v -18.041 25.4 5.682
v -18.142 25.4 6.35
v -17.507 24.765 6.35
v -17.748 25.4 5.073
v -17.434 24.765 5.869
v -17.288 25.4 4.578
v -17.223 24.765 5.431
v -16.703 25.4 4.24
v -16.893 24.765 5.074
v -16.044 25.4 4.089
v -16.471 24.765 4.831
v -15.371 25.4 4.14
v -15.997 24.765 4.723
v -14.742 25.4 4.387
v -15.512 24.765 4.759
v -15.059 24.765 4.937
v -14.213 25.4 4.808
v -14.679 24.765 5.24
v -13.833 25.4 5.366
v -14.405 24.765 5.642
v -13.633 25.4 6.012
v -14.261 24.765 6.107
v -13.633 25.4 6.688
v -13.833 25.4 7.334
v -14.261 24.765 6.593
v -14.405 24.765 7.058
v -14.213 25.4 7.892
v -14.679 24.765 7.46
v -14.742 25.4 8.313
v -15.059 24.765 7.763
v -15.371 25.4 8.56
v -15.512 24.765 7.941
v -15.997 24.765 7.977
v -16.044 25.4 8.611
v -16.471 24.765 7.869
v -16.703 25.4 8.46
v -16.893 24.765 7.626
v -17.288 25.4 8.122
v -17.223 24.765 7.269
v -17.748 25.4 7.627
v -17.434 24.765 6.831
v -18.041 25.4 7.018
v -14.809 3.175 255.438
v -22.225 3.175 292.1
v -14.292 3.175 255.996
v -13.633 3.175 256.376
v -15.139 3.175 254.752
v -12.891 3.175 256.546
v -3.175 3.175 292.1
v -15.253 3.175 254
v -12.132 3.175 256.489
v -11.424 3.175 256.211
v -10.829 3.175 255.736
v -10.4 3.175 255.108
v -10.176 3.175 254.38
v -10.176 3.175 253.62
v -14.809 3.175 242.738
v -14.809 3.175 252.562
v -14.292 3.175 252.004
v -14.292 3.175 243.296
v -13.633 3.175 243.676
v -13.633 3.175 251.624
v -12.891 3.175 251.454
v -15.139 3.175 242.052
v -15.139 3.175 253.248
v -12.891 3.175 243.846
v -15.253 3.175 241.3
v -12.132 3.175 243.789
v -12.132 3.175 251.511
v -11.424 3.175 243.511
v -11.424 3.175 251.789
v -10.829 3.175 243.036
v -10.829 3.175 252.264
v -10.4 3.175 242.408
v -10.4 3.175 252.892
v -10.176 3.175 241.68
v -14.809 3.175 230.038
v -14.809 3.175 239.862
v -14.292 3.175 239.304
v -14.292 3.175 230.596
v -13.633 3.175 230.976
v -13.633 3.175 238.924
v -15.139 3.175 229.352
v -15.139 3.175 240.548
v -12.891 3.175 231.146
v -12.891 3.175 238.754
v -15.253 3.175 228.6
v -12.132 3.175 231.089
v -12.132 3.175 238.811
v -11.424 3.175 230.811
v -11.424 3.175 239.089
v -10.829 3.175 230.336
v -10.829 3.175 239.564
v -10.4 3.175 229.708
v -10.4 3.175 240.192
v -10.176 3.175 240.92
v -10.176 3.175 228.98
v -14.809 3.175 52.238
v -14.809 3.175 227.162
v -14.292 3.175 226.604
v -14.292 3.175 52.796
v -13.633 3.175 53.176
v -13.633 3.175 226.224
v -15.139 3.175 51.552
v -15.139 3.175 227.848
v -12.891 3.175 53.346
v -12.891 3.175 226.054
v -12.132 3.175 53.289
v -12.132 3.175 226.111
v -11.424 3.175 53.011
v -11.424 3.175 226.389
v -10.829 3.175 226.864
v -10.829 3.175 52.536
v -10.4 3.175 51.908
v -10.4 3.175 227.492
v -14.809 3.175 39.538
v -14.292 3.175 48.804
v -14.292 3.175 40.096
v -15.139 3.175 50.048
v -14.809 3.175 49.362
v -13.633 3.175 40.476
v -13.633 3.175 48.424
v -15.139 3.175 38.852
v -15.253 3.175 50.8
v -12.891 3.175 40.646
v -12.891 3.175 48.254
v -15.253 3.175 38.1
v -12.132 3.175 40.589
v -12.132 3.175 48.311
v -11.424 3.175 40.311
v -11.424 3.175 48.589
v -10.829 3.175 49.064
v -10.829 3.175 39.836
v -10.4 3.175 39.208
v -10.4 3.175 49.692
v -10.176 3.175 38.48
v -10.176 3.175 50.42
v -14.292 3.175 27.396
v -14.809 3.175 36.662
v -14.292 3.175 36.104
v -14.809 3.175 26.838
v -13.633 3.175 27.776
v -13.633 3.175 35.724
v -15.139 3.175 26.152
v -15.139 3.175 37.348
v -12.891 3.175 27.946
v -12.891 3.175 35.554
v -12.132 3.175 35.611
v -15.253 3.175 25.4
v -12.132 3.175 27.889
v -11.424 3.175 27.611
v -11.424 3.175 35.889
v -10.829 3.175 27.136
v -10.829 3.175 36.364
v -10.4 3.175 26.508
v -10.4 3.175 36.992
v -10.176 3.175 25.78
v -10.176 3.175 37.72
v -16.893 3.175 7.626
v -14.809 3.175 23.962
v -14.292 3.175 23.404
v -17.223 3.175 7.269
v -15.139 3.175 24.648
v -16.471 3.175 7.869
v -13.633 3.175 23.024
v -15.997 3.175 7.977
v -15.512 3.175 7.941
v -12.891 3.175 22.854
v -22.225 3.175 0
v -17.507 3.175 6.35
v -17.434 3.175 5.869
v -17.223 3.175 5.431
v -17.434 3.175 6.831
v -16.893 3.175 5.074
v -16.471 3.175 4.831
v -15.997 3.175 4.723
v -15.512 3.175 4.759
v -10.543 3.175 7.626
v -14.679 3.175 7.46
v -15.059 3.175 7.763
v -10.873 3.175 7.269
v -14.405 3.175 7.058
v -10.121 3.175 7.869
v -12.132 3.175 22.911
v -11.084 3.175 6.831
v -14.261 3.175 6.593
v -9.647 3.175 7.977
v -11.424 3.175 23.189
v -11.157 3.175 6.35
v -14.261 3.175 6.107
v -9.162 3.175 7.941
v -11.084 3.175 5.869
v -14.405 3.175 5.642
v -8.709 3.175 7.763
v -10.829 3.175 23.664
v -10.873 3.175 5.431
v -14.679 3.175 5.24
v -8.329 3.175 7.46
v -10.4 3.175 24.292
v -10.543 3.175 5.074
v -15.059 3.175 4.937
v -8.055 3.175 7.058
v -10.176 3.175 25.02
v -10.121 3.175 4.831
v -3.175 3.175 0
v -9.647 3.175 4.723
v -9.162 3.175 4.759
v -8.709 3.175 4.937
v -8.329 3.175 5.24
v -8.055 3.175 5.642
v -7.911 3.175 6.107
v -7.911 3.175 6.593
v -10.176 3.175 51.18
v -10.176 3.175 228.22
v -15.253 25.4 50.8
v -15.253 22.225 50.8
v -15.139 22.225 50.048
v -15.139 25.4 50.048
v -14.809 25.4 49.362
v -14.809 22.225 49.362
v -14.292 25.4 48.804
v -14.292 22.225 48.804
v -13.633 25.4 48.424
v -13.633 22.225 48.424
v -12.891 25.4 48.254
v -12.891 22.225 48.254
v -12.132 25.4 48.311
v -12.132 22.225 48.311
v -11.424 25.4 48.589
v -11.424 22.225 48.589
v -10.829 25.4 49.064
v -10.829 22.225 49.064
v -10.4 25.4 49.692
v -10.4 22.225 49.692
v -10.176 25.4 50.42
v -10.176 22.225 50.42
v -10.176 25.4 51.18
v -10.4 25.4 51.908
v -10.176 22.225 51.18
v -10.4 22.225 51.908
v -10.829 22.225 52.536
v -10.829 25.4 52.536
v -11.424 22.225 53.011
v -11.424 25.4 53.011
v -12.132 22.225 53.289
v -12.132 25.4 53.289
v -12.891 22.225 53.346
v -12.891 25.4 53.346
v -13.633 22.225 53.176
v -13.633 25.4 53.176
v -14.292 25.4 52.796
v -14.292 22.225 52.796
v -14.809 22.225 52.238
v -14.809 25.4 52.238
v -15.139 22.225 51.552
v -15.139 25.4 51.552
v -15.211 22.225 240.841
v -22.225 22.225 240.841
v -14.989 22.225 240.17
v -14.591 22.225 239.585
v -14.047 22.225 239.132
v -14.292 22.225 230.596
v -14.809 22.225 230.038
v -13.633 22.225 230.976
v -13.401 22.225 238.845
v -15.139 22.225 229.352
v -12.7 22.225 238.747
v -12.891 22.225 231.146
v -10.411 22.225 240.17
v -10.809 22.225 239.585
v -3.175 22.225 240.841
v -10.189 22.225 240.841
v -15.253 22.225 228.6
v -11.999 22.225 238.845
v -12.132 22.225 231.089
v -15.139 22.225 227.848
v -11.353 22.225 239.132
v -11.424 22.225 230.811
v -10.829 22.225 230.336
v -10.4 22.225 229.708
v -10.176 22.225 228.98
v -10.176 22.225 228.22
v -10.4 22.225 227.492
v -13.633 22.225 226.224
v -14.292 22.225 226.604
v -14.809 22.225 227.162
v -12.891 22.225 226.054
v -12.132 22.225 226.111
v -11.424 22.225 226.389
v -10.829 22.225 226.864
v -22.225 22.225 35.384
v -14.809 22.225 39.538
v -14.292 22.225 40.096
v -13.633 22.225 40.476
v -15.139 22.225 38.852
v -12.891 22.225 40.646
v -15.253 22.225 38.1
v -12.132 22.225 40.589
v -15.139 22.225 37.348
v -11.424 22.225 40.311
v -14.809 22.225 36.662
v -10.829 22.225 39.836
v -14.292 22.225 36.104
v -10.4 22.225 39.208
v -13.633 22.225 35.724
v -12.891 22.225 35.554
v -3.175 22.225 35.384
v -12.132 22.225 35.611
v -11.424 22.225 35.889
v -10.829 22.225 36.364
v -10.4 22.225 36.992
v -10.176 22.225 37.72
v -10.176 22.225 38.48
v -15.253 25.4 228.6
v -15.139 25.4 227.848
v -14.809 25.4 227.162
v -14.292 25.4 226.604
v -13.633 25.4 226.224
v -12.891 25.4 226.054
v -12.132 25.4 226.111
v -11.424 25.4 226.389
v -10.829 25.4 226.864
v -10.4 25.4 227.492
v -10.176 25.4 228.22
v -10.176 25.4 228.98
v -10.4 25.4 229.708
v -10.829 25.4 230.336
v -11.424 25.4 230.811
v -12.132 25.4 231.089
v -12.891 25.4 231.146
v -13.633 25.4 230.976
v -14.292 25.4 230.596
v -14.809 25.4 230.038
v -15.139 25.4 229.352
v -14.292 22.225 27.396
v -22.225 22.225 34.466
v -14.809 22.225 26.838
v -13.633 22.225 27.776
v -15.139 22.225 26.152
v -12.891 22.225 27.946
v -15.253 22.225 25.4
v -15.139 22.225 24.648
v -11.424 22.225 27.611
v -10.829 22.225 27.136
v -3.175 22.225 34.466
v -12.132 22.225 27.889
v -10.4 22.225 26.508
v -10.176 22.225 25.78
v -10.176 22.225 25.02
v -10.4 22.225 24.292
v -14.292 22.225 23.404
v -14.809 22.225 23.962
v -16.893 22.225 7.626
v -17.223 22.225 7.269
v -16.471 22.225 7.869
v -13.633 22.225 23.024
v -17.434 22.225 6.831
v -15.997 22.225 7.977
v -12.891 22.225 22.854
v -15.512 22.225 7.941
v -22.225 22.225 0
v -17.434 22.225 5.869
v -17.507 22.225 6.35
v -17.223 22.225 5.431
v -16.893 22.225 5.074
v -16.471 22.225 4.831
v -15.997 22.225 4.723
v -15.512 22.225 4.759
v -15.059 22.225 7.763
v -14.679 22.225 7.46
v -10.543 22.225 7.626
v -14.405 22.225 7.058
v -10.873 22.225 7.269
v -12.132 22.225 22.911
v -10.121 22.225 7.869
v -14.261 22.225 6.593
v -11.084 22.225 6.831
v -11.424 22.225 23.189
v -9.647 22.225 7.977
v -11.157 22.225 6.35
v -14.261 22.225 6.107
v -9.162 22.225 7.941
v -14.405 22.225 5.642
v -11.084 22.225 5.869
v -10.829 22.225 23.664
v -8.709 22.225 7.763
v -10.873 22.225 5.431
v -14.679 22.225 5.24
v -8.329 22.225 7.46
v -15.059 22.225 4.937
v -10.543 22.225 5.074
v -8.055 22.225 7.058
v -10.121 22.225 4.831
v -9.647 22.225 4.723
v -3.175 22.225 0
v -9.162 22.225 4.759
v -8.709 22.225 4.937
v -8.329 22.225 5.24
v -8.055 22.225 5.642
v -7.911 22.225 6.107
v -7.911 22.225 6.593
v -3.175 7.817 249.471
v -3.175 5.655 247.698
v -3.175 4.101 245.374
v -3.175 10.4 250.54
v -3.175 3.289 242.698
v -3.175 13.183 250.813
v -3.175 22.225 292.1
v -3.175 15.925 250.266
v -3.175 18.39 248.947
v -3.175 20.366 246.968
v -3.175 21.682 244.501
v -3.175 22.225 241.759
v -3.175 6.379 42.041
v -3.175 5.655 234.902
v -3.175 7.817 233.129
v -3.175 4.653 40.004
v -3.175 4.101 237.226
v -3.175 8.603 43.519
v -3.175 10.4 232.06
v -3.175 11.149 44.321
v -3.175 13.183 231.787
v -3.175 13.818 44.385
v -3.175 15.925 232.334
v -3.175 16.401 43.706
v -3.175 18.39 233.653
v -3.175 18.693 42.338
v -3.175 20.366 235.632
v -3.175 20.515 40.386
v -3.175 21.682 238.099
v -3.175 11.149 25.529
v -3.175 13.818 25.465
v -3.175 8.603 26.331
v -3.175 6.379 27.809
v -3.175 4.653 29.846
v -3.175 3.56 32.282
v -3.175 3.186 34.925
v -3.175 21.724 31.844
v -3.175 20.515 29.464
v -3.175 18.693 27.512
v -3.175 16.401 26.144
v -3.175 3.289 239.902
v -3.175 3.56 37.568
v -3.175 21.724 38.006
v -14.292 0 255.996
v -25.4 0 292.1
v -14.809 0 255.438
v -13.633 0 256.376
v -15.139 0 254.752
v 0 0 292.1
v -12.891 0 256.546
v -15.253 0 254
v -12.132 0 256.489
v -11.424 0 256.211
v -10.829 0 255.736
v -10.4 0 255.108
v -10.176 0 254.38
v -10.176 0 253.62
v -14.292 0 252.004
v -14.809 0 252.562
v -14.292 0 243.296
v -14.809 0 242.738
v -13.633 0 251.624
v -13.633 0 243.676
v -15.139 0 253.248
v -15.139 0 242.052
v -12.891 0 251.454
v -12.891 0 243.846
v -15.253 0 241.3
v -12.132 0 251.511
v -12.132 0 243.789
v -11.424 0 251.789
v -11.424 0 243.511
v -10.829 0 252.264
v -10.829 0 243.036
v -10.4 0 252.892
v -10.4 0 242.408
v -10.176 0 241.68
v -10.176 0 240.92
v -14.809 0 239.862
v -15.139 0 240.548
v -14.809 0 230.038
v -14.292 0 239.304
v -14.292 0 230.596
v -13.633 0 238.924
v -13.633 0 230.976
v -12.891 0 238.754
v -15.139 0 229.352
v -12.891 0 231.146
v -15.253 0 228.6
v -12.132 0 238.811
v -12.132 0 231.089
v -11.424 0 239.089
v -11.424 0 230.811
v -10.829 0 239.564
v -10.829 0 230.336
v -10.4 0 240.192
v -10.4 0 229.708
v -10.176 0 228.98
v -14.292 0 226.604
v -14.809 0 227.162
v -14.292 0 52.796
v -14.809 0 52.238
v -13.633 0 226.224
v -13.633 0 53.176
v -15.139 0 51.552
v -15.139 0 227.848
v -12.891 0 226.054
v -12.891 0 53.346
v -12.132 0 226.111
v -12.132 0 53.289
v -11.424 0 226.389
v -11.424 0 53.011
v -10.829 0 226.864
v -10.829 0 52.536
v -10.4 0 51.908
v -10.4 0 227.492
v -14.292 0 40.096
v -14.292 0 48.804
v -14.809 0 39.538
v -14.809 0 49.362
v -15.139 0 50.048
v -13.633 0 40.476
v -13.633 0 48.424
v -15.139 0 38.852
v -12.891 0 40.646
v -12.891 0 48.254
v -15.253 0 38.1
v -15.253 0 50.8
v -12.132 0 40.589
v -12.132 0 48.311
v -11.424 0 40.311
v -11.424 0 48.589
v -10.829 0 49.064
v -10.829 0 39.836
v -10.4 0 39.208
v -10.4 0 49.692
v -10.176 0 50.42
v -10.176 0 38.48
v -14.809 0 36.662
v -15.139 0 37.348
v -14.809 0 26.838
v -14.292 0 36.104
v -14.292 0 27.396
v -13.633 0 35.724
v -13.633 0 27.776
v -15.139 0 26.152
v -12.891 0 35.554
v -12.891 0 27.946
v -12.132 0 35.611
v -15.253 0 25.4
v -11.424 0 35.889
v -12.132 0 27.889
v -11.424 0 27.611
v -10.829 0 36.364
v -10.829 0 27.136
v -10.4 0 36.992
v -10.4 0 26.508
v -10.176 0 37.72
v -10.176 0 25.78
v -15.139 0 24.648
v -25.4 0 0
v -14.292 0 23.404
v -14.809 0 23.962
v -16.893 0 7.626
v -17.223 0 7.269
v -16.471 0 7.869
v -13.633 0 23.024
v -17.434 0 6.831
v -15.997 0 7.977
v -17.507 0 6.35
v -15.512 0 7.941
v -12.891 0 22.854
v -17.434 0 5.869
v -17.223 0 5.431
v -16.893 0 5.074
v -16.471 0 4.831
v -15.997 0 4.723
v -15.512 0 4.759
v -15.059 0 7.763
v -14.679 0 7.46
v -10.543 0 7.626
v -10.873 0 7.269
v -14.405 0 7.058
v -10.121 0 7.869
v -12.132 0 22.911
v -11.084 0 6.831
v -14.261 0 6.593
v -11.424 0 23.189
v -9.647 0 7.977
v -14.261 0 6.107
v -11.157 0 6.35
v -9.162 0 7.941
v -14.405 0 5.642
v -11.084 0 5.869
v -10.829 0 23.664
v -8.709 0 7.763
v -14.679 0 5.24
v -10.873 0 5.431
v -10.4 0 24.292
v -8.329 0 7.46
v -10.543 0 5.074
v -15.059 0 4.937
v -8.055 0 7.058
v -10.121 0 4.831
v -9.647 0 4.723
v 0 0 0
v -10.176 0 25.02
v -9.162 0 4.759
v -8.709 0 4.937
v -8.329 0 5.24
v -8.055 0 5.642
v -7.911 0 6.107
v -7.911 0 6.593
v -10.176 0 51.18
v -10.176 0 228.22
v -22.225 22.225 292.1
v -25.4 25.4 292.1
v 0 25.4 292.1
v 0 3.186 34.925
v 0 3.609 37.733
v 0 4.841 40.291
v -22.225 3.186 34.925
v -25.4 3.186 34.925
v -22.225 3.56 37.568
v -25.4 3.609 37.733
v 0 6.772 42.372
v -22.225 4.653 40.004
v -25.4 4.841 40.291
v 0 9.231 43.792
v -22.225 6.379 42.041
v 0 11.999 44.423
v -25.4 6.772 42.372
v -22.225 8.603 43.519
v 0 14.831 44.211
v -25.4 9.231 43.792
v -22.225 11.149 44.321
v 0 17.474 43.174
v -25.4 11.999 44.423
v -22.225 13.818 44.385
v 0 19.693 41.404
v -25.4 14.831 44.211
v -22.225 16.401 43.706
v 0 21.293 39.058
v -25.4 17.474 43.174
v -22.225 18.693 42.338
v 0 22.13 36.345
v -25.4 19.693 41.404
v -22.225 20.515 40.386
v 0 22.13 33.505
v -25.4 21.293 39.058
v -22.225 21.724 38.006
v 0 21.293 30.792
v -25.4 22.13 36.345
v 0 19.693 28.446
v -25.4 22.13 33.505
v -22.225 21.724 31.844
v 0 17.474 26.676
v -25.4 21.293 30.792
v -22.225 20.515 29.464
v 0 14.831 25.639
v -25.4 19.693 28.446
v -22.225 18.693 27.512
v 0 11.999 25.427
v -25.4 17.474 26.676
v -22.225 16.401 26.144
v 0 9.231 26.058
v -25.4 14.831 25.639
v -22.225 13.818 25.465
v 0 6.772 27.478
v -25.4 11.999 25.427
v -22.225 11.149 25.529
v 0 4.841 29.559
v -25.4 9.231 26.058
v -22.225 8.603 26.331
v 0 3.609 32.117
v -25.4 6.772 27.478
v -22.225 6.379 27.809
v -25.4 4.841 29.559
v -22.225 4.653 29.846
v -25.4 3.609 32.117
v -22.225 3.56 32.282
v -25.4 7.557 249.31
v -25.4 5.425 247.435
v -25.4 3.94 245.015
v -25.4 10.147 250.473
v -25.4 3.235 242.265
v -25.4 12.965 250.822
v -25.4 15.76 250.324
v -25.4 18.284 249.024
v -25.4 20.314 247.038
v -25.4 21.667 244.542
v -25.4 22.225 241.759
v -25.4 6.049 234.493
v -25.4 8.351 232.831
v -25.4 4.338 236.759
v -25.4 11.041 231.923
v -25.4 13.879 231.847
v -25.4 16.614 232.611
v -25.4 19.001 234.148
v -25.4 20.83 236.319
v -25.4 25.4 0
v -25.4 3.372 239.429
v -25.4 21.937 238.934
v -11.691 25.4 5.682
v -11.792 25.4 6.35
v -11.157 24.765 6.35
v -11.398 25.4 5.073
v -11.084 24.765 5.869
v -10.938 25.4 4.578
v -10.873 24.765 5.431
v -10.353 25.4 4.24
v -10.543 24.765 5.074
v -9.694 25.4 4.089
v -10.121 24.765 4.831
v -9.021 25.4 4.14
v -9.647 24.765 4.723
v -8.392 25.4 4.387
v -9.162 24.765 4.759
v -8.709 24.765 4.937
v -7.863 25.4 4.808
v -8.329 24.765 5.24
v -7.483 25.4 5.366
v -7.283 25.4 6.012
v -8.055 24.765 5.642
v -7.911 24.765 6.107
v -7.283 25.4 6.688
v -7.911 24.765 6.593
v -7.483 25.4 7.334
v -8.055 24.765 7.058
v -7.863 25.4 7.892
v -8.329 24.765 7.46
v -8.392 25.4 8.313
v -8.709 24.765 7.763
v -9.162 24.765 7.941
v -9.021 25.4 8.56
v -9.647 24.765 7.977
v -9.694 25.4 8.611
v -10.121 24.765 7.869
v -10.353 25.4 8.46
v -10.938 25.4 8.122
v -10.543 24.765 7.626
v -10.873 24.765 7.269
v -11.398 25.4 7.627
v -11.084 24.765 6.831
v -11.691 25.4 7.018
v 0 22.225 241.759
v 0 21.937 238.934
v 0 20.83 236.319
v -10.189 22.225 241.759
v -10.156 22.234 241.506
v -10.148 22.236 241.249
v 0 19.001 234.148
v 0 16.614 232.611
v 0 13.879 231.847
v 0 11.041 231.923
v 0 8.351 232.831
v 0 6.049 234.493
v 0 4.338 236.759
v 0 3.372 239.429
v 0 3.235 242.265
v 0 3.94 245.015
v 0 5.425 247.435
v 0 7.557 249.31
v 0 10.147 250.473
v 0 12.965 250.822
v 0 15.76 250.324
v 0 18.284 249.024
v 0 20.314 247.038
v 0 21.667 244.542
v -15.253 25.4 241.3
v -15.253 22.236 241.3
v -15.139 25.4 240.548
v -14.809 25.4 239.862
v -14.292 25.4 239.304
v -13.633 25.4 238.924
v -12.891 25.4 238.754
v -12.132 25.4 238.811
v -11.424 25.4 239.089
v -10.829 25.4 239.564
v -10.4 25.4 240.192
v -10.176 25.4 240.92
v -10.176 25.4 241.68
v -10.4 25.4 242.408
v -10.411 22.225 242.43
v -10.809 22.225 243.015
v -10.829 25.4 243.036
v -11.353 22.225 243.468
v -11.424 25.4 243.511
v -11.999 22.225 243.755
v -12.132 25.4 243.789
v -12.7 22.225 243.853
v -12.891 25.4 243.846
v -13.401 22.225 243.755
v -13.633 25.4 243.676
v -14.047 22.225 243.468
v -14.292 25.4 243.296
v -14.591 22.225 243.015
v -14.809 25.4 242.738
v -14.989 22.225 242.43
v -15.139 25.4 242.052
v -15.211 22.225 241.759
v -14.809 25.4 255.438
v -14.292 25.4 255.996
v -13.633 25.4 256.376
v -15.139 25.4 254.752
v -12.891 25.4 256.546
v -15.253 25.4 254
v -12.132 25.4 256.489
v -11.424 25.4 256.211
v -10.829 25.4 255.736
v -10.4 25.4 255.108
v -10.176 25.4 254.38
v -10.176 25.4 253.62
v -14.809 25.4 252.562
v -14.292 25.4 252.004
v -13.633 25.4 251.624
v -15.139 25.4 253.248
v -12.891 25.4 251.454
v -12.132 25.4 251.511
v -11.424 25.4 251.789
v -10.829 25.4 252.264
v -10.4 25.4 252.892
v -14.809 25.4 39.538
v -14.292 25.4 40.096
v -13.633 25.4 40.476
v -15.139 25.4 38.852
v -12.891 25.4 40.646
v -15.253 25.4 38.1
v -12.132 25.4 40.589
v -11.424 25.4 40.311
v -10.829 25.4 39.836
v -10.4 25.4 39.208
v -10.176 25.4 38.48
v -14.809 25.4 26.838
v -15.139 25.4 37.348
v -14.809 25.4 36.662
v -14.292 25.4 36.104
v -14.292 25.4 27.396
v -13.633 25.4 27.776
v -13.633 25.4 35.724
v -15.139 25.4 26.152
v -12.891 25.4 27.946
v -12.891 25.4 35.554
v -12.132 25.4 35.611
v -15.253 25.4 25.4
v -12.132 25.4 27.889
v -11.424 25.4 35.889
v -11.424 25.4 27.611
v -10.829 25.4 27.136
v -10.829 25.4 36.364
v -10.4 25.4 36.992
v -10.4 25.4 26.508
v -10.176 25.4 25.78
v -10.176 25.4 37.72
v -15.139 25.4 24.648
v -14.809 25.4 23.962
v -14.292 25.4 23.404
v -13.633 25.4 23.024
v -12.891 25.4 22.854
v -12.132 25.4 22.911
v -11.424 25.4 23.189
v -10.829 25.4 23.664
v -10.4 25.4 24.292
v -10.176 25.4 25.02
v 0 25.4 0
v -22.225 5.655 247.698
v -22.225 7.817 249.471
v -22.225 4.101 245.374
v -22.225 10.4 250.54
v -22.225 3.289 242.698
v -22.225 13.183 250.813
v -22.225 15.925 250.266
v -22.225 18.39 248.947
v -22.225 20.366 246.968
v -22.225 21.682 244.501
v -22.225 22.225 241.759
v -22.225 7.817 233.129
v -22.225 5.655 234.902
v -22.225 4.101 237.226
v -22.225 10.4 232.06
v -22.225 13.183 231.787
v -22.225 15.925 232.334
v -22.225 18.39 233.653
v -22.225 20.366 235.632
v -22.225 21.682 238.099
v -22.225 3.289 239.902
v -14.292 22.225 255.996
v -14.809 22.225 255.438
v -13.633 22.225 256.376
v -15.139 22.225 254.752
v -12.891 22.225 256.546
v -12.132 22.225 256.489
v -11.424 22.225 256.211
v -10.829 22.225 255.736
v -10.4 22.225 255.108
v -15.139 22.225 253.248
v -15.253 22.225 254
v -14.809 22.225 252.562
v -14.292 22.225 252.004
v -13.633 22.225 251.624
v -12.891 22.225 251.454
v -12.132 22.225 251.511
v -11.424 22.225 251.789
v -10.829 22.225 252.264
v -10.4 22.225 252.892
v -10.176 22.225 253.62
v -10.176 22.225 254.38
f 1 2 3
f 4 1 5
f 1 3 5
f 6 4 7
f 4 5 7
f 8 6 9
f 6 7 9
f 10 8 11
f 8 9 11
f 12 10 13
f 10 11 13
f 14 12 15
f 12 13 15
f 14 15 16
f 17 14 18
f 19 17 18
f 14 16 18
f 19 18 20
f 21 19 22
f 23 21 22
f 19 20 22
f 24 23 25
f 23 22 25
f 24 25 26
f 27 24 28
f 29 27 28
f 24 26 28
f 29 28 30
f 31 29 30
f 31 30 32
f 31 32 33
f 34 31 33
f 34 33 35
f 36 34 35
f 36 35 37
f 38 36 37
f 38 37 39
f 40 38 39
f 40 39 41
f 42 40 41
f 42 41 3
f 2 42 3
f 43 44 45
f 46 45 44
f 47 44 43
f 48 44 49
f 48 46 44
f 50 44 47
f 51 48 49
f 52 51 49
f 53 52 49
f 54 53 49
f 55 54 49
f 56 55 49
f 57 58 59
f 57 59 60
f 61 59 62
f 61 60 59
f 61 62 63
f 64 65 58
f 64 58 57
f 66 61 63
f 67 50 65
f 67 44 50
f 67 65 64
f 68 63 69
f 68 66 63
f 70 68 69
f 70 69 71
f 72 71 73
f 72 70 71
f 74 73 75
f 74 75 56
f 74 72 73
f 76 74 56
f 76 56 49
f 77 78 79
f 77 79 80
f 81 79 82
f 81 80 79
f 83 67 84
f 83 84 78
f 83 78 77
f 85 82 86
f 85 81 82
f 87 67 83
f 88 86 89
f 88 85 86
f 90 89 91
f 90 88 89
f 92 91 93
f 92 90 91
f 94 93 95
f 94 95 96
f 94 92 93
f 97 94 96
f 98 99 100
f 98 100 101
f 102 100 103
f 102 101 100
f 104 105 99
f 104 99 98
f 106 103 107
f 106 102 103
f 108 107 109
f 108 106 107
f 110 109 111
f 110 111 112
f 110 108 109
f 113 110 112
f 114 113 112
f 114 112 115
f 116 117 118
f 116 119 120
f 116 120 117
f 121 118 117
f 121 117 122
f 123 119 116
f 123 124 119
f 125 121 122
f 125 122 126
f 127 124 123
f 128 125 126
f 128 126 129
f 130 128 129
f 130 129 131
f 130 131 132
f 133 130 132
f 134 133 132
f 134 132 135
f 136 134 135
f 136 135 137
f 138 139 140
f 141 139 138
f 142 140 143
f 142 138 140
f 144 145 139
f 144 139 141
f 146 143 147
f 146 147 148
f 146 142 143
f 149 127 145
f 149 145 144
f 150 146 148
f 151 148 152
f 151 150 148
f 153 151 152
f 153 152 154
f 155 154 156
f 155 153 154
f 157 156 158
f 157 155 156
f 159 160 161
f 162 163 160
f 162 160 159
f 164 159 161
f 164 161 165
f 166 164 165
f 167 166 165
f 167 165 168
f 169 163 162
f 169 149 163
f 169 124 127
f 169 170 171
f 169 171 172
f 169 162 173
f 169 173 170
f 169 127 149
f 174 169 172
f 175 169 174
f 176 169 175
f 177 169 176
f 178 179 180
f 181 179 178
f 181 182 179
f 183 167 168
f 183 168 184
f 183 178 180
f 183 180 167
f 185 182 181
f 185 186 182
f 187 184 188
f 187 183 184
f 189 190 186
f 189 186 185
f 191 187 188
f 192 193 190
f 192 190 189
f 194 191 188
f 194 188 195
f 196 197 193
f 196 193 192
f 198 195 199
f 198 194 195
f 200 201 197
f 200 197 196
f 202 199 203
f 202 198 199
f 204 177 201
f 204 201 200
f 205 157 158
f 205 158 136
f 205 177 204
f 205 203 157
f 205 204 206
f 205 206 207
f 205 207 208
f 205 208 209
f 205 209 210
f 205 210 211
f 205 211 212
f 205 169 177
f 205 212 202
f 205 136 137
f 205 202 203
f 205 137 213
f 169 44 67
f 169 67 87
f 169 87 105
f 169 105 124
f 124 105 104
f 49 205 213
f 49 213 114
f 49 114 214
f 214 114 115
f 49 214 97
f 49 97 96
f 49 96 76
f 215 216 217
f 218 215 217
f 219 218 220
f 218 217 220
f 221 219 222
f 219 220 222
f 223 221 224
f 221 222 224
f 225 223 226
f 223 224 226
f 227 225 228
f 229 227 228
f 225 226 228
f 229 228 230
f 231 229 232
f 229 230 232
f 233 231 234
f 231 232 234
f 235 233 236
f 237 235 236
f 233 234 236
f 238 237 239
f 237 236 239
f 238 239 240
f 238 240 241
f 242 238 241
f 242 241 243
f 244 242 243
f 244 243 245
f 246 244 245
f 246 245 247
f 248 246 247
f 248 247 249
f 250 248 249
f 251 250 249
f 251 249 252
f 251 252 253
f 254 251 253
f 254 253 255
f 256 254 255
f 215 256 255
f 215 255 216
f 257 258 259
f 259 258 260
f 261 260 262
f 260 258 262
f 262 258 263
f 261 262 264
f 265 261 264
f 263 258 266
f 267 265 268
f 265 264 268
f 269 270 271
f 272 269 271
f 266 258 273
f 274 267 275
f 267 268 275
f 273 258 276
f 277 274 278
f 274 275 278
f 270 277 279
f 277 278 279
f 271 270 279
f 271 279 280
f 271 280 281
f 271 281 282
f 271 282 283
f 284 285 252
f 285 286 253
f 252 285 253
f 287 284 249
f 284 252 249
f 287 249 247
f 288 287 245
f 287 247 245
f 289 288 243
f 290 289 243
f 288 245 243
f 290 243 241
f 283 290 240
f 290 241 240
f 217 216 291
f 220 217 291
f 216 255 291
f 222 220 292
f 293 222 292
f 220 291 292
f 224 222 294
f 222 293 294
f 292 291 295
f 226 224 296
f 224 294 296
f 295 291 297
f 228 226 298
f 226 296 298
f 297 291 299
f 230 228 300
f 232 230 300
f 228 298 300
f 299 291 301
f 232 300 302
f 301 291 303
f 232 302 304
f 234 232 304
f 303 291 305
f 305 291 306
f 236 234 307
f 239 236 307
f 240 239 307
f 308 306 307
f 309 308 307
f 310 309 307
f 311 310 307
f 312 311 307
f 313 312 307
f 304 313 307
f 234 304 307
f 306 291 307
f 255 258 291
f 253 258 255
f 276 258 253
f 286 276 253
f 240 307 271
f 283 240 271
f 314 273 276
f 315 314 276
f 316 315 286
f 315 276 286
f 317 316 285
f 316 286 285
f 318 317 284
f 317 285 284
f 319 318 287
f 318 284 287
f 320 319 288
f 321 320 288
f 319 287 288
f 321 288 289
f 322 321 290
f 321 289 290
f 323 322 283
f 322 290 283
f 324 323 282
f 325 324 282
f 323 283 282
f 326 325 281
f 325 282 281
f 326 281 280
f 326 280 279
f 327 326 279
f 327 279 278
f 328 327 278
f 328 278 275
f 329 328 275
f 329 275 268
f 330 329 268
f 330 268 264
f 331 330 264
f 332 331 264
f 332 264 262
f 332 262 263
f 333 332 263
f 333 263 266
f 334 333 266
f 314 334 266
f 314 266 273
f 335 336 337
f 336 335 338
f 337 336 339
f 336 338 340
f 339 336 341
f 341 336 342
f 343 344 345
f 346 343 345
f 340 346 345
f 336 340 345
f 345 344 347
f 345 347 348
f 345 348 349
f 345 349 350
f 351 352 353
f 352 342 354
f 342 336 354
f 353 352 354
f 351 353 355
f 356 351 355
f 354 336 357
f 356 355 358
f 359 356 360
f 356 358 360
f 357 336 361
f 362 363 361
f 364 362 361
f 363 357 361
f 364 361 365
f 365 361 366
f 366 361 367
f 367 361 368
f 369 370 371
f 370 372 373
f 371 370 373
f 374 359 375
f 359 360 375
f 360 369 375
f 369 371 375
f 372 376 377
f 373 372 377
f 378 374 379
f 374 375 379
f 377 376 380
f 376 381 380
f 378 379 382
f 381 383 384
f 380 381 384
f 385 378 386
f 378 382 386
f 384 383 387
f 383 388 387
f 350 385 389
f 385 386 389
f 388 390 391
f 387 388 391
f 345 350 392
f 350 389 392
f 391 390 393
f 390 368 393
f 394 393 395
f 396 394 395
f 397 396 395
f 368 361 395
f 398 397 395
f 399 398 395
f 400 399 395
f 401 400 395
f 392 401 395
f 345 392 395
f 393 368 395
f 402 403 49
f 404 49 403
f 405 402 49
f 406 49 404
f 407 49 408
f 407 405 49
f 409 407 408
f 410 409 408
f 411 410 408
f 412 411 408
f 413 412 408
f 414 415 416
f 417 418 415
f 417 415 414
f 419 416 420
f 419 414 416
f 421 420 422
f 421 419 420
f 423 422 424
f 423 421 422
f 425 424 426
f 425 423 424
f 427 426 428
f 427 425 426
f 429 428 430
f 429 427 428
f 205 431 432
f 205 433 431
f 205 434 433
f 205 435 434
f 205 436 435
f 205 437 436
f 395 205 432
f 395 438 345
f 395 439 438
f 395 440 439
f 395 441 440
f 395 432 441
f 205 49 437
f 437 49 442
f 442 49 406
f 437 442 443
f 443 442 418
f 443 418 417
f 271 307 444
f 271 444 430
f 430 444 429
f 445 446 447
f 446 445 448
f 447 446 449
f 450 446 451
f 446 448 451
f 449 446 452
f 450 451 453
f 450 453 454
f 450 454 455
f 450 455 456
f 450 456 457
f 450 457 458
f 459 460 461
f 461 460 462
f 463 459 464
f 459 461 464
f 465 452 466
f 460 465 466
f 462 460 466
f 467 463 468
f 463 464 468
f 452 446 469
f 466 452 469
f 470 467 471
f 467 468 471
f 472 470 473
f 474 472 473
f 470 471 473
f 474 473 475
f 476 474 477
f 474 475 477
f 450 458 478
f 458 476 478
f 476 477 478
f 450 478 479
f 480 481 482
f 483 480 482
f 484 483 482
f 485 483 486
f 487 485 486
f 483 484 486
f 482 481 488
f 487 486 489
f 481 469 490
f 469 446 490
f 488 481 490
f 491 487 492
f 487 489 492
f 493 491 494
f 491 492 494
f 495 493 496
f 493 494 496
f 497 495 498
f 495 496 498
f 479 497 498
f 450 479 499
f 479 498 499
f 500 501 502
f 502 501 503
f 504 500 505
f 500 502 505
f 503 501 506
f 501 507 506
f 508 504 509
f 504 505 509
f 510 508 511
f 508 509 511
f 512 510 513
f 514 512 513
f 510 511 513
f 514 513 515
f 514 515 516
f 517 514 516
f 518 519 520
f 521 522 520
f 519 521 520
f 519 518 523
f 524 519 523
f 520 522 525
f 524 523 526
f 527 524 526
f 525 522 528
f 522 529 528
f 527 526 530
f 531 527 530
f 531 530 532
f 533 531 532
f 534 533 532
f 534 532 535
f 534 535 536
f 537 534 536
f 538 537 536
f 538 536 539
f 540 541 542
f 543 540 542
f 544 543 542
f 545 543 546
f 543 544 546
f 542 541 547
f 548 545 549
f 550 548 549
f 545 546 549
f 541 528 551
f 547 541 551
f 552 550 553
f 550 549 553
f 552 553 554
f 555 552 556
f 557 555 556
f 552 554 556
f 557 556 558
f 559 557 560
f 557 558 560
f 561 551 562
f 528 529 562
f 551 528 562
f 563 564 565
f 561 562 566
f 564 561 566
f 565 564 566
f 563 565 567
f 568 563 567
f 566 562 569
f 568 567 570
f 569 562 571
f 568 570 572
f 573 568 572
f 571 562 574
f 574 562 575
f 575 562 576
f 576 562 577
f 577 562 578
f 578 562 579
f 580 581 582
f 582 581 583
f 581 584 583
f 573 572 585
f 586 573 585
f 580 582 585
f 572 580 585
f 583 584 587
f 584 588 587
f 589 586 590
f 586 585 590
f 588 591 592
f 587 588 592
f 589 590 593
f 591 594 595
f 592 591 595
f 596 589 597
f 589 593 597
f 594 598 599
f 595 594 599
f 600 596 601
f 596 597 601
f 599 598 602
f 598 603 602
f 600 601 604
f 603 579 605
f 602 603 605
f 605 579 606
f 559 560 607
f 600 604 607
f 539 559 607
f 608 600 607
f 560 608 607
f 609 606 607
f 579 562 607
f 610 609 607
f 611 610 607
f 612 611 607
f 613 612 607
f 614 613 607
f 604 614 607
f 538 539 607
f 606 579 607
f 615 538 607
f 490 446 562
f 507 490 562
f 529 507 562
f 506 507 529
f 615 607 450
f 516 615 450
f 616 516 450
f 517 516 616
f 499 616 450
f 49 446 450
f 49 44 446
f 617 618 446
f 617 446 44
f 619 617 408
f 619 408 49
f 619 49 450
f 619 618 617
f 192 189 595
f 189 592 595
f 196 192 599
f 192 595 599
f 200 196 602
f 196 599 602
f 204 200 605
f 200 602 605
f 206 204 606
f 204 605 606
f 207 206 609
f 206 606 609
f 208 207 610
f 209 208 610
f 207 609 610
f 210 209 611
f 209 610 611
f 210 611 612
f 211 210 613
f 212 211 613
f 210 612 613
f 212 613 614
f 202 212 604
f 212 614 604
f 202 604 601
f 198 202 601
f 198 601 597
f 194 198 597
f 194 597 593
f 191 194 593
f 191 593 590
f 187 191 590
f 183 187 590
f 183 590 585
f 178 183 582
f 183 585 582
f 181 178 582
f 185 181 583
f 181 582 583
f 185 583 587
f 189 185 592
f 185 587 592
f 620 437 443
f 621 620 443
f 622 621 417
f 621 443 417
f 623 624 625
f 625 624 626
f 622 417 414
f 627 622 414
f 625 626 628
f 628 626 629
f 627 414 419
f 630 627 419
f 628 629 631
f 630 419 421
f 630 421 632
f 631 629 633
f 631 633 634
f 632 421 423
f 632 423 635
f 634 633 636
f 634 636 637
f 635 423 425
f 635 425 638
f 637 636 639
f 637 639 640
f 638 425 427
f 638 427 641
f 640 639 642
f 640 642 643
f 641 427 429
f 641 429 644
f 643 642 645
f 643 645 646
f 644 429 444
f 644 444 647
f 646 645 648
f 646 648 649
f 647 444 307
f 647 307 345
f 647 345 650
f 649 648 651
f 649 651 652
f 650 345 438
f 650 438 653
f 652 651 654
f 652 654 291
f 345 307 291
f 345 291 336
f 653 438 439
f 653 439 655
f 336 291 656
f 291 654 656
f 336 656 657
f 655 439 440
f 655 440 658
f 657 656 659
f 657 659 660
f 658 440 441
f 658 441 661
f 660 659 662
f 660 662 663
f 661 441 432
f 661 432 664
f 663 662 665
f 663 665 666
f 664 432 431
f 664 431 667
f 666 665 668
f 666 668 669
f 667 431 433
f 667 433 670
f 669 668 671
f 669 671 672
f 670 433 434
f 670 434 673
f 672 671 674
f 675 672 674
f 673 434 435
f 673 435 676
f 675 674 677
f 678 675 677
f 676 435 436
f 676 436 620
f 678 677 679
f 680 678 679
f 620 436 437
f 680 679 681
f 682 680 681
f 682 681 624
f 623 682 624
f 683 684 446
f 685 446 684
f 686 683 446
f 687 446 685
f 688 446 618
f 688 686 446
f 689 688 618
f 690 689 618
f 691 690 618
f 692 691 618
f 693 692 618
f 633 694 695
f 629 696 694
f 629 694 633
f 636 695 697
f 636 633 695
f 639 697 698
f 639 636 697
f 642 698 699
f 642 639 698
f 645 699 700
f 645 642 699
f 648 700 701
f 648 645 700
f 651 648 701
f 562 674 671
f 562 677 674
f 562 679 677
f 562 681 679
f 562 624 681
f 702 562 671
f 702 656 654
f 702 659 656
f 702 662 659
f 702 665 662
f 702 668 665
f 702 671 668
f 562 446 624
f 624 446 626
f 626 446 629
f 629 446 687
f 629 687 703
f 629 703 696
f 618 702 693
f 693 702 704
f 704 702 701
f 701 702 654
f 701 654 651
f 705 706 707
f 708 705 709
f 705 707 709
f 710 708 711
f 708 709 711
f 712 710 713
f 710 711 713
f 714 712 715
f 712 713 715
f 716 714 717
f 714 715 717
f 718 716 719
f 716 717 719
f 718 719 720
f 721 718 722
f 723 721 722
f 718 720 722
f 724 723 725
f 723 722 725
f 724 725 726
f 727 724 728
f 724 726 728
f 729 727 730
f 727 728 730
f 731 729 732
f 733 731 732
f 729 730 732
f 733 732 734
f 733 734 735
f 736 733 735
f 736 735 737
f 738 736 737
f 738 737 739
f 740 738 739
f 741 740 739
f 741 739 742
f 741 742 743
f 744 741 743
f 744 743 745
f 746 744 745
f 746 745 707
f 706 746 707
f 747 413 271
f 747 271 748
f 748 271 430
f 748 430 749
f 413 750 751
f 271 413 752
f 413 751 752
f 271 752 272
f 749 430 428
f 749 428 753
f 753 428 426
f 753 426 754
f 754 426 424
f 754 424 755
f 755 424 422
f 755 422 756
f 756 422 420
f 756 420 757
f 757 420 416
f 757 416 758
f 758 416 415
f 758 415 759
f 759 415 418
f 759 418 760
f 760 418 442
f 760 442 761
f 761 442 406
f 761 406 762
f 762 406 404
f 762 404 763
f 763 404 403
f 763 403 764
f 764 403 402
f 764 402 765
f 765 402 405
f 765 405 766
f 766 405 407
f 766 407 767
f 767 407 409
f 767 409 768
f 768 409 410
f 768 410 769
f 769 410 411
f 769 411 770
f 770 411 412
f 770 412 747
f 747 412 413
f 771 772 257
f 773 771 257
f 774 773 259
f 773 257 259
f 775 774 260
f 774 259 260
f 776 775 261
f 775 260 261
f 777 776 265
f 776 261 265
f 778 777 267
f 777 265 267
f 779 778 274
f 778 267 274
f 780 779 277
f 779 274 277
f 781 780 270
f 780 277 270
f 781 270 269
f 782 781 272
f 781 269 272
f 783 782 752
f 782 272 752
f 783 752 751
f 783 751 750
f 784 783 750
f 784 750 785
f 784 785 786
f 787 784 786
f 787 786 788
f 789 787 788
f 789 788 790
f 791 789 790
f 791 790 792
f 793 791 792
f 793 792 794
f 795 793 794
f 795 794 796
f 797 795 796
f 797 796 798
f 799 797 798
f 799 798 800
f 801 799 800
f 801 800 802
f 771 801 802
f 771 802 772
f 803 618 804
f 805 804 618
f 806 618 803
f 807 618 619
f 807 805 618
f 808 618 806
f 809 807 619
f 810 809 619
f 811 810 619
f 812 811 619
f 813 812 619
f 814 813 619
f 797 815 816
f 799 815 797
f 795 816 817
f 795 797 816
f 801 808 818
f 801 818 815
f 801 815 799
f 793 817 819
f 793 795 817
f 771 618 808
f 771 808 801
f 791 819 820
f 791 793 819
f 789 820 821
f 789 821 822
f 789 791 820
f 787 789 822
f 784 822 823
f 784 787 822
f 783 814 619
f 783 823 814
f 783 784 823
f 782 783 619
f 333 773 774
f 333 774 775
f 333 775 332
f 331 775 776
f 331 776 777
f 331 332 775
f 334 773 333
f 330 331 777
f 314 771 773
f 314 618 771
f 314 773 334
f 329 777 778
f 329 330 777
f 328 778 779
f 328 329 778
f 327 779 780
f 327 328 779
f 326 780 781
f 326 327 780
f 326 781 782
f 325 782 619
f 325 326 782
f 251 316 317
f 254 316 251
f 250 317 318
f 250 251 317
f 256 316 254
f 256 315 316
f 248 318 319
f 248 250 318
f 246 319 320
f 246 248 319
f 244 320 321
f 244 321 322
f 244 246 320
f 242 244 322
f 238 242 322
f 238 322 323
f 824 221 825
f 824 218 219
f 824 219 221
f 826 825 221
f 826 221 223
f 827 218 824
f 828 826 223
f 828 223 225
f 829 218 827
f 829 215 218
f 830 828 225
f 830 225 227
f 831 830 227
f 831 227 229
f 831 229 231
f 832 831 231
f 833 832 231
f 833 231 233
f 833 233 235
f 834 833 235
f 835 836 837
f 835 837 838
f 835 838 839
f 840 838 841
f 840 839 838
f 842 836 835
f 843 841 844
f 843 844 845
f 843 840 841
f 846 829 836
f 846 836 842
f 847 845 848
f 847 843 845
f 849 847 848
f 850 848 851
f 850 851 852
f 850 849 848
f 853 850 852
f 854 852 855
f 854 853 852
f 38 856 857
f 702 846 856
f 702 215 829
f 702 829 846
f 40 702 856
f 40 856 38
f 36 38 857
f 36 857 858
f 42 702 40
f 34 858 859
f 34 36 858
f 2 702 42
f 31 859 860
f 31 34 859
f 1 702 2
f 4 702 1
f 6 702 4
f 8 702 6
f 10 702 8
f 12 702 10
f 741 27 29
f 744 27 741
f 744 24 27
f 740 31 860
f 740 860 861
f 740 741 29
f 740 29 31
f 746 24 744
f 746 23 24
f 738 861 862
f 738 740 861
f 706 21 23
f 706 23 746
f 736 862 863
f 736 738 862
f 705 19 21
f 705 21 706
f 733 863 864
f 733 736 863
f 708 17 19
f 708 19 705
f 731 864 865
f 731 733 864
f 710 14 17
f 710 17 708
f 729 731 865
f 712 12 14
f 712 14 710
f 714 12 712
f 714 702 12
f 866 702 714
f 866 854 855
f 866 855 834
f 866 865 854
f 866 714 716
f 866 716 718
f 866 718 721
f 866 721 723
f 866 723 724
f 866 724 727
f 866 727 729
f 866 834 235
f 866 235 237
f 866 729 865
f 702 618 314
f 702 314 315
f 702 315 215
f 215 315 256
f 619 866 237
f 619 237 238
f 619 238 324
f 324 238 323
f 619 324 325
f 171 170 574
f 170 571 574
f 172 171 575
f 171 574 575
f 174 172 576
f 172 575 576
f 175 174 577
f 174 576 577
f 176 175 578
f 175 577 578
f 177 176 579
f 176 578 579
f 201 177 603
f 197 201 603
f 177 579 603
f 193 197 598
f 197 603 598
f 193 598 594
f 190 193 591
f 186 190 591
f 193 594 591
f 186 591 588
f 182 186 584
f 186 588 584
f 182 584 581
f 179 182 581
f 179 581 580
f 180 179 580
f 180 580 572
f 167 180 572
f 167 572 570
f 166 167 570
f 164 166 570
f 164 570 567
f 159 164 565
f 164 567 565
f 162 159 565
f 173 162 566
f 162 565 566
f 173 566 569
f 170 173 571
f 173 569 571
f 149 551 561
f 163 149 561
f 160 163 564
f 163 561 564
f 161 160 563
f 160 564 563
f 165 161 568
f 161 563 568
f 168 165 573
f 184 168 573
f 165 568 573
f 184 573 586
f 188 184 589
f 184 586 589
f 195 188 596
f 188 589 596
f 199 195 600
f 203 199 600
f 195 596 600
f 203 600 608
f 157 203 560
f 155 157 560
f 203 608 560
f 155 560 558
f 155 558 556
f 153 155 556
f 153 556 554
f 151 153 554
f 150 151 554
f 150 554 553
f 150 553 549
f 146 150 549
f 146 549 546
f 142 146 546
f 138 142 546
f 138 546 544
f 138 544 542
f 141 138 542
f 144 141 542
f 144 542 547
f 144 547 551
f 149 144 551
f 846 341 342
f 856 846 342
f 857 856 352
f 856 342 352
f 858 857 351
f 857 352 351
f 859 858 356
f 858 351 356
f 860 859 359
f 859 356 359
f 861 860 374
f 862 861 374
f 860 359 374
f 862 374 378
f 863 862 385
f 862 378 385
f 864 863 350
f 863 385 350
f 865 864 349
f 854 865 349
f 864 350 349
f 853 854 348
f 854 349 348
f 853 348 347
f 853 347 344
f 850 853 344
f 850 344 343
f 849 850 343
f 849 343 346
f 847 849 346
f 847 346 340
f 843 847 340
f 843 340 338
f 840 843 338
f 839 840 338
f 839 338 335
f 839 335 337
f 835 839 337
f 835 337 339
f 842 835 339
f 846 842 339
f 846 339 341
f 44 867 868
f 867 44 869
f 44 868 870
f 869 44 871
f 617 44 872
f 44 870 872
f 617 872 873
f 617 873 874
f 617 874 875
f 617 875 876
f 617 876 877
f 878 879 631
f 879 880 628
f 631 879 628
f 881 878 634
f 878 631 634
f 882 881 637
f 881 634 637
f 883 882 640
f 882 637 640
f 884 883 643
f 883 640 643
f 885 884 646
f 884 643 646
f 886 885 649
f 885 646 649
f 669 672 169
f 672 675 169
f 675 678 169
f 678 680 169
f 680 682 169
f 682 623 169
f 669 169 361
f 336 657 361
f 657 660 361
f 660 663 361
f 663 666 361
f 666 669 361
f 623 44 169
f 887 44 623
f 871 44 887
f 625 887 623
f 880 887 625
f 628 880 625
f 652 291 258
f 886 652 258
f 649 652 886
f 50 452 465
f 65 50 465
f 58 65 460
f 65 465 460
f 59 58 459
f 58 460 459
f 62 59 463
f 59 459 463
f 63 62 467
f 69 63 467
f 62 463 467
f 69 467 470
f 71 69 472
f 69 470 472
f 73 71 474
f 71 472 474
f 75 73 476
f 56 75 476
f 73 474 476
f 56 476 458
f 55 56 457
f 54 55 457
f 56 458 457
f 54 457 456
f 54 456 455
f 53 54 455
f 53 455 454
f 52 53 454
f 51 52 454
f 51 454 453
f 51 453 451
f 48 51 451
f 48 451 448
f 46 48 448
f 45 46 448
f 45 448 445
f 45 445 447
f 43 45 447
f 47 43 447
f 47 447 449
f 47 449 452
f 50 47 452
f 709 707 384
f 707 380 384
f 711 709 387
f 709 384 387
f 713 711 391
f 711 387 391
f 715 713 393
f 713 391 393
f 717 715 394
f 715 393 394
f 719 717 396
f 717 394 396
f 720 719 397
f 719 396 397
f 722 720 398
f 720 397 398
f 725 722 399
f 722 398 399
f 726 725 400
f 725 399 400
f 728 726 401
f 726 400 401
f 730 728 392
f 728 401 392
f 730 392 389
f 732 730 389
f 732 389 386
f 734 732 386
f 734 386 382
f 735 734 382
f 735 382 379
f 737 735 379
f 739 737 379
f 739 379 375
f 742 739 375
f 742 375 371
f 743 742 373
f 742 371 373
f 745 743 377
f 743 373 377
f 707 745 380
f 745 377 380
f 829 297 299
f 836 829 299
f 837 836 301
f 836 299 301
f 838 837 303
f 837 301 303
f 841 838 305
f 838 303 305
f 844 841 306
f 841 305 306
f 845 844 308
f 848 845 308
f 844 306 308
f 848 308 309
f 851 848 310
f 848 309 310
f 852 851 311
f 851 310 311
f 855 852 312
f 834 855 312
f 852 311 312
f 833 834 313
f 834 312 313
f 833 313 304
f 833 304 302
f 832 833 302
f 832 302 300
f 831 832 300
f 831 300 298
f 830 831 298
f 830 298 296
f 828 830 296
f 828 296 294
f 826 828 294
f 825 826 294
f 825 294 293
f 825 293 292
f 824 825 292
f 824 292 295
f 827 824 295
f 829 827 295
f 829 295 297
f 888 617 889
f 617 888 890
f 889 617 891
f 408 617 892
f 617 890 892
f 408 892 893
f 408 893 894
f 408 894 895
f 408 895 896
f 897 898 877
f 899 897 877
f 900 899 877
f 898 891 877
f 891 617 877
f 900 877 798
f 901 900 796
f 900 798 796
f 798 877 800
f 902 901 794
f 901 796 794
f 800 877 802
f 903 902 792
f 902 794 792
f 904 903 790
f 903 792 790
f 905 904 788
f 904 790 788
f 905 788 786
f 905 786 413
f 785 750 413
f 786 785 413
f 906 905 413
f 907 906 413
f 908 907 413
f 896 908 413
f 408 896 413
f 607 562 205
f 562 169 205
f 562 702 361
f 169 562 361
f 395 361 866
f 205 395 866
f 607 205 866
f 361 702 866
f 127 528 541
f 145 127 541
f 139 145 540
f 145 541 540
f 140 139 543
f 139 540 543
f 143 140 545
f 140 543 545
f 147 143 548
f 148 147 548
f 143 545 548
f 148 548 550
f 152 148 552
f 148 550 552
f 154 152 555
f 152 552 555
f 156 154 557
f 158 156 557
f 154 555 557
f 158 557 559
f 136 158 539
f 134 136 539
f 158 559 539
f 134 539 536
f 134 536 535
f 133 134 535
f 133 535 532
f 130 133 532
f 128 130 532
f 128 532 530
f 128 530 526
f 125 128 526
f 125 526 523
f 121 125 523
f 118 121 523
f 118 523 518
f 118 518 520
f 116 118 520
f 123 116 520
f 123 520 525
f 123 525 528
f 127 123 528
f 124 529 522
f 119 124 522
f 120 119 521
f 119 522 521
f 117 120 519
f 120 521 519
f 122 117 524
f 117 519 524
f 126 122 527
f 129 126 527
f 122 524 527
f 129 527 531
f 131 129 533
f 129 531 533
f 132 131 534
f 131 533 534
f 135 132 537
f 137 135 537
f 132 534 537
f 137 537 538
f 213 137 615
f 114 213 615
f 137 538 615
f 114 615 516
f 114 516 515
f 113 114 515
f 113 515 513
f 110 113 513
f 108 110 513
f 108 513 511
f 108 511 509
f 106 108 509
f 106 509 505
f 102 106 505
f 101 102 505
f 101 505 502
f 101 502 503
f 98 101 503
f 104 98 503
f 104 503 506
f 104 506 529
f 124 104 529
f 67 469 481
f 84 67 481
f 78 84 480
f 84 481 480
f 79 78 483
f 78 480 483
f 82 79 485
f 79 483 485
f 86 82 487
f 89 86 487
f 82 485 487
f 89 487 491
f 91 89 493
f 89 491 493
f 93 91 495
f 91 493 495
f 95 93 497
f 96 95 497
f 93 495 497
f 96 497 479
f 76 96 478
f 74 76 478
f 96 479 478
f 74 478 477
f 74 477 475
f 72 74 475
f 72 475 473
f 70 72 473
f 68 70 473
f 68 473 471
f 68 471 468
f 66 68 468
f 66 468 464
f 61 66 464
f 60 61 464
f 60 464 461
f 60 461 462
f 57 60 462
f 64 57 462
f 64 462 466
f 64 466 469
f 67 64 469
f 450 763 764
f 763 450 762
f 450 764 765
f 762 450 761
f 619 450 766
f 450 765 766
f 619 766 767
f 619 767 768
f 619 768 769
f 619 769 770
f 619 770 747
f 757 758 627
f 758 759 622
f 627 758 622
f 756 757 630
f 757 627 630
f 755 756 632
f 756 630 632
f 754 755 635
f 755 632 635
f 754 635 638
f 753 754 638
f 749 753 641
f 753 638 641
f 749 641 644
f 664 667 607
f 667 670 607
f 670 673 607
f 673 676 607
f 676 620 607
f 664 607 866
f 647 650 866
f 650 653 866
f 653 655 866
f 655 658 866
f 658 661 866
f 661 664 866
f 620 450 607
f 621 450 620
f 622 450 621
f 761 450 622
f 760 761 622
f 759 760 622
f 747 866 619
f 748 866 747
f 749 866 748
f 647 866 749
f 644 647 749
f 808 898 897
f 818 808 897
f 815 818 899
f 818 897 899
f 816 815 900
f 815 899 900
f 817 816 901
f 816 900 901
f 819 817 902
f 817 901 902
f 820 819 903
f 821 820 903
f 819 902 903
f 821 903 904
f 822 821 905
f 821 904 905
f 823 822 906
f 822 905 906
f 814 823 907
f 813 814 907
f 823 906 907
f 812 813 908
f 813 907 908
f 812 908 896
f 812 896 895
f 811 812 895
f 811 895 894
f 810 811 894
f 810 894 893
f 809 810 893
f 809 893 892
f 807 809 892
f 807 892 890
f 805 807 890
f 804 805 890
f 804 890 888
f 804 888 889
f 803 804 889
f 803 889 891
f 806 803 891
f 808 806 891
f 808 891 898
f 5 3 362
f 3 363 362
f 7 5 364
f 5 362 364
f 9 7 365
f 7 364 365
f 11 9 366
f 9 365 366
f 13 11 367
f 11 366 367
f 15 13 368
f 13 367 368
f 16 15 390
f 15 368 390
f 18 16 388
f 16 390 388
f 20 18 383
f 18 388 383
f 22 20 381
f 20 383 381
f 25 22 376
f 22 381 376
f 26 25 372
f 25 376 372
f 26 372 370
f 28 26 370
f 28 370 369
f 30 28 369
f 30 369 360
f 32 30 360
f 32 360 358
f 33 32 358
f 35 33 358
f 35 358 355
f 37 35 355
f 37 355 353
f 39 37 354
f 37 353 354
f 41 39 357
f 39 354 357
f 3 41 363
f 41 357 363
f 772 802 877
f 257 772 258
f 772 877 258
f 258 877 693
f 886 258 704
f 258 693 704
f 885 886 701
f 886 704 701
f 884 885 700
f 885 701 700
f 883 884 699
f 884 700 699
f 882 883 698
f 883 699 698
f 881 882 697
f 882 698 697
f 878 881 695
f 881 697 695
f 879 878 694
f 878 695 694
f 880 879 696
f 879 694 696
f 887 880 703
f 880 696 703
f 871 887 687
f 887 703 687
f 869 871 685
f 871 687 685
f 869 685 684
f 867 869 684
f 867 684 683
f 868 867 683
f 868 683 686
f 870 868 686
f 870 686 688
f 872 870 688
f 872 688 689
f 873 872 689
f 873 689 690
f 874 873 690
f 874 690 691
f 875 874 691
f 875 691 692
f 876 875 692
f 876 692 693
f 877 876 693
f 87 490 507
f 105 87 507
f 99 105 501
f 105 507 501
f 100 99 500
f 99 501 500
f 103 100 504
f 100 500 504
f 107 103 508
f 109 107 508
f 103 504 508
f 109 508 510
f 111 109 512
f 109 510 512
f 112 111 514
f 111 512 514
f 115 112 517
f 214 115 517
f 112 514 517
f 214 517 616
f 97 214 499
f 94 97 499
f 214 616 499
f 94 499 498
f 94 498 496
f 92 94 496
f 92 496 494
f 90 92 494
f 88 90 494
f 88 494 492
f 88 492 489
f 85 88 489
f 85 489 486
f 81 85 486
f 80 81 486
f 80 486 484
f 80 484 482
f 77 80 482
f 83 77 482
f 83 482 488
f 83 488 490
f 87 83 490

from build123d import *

# Parameters (mm, degrees)
SKETCH1_W                       = 25.4
SKETCH1_H                       = 25.4
SKETCH1_W_2                     = 19.05
SKETCH1_H_2                     = 19.05
BOSS_EXTRUDE1_DEPTH             = 292.1
F_10_CLEARANCE_HOLE1_D          = 5.1054
CUT_EXTRUDE1_REACH              = 296.3
SKETCH6_R                       = 9.525
CUT_EXTRUDE1_DIRECTION_2_DEPTH  = 295.300407747
F_4_CLEARANCE_HOLE1_D           = 3.2639
F_4_CLEARANCE_HOLE1_CSINK_D     = 4.5339
F_4_CLEARANCE_HOLE1_CSINK_ANGLE = 90
F_10_CLEARANCE_HOLE2_D          = 5.1054


with BuildPart() as part:
    # Sketch1 → Boss-Extrude1 (new body)
    with BuildSketch(Plane.XY):
        with Locations((-12.7, 12.7)):
            Rectangle(SKETCH1_W, SKETCH1_H)
        with Locations((-12.7, 12.7)):
            Rectangle(SKETCH1_W_2, SKETCH1_H_2, mode=Mode.SUBTRACT)
    extrude(amount=BOSS_EXTRUDE1_DEPTH)

    # #10 Clearance Hole1 (through all)
    with Locations(Plane(origin=(0, 25.4, 0), x_dir=(1, 0, 0), z_dir=(0, 1, 0))):
        with Locations((-12.7, -254), (-12.7, -241.3), (-12.7, -228.6)):
            Hole(F_10_CLEARANCE_HOLE1_D / 2)

    # Cut-Extrude1: up to this face of the body (flat: up to its plane)
    cut_extrude1_end = Plane(part.part.faces().sort_by_distance((0, 12.7, 146.05))[0])
    # Sketch6 → Cut-Extrude1 (cut, up to the picked face)
    with BuildSketch(Plane.ZY.offset(25.4), mode=Mode.PRIVATE) as cut_extrude1_sk1:
        with Locations(Location((241.3, 12.711043767, 0), (0, 0, 87.24065676))):
            Circle(SKETCH6_R)
    cut_extrude1_tool1 = split(extrude(cut_extrude1_sk1.sketch, amount=-CUT_EXTRUDE1_REACH, mode=Mode.PRIVATE), bisect_by=cut_extrude1_end, keep=Keep.BOTH, mode=Mode.PRIVATE)
    # Sketch6 → Cut-Extrude1 (cut, up to the picked face)
    with BuildSketch(Plane.ZY.offset(25.4), mode=Mode.PRIVATE) as cut_extrude1_sk2:
        with Locations(Location((34.925, 12.711043767, 0), (0, 0, 270))):
            Circle(SKETCH6_R)
    cut_extrude1_tool2 = split(extrude(cut_extrude1_sk2.sketch, amount=-CUT_EXTRUDE1_REACH, mode=Mode.PRIVATE), bisect_by=cut_extrude1_end, keep=Keep.BOTH, mode=Mode.PRIVATE)
    add(cut_extrude1_tool1.solids().sort_by(Axis((-25.4, 12.711044, 241.3), (1, 0, 0)))[0], mode=Mode.SUBTRACT)
    add(cut_extrude1_tool2.solids().sort_by(Axis((-25.4, 12.711044, 34.925), (1, 0, 0)))[0], mode=Mode.SUBTRACT)

    # Sketch6 → Cut-Extrude1 direction 2 (cut)
    with BuildSketch(Plane.ZY.offset(25.4)):
        with Locations(Location((241.3, 12.711043767, 0), (0, 0, 87.24065676))):
            Circle(SKETCH6_R)
        with Locations(Location((34.925, 12.711043767, 0), (0, 0, 270))):
            Circle(SKETCH6_R)
    extrude(amount=CUT_EXTRUDE1_DIRECTION_2_DEPTH, mode=Mode.SUBTRACT)

    # #4 Clearance Hole1 (through all)
    with Locations(Plane(origin=(0, 25.4, 0), x_dir=(1, 0, 0), z_dir=(0, 1, 0))):
        with Locations((-9.525, -6.35), (-15.875, -6.35)):
            CounterSinkHole(F_4_CLEARANCE_HOLE1_D / 2, F_4_CLEARANCE_HOLE1_CSINK_D / 2, counter_sink_angle=F_4_CLEARANCE_HOLE1_CSINK_ANGLE)

    # #10 Clearance Hole2 (through all)
    with Locations(Plane(origin=(0, 25.4, 0), x_dir=(1, 0, 0), z_dir=(0, 1, 0))):
        with Locations((-12.7, -50.8), (-12.7, -38.1), (-12.7, -25.4)):
            Hole(F_10_CLEARANCE_HOLE2_D / 2)


solid = part.part
